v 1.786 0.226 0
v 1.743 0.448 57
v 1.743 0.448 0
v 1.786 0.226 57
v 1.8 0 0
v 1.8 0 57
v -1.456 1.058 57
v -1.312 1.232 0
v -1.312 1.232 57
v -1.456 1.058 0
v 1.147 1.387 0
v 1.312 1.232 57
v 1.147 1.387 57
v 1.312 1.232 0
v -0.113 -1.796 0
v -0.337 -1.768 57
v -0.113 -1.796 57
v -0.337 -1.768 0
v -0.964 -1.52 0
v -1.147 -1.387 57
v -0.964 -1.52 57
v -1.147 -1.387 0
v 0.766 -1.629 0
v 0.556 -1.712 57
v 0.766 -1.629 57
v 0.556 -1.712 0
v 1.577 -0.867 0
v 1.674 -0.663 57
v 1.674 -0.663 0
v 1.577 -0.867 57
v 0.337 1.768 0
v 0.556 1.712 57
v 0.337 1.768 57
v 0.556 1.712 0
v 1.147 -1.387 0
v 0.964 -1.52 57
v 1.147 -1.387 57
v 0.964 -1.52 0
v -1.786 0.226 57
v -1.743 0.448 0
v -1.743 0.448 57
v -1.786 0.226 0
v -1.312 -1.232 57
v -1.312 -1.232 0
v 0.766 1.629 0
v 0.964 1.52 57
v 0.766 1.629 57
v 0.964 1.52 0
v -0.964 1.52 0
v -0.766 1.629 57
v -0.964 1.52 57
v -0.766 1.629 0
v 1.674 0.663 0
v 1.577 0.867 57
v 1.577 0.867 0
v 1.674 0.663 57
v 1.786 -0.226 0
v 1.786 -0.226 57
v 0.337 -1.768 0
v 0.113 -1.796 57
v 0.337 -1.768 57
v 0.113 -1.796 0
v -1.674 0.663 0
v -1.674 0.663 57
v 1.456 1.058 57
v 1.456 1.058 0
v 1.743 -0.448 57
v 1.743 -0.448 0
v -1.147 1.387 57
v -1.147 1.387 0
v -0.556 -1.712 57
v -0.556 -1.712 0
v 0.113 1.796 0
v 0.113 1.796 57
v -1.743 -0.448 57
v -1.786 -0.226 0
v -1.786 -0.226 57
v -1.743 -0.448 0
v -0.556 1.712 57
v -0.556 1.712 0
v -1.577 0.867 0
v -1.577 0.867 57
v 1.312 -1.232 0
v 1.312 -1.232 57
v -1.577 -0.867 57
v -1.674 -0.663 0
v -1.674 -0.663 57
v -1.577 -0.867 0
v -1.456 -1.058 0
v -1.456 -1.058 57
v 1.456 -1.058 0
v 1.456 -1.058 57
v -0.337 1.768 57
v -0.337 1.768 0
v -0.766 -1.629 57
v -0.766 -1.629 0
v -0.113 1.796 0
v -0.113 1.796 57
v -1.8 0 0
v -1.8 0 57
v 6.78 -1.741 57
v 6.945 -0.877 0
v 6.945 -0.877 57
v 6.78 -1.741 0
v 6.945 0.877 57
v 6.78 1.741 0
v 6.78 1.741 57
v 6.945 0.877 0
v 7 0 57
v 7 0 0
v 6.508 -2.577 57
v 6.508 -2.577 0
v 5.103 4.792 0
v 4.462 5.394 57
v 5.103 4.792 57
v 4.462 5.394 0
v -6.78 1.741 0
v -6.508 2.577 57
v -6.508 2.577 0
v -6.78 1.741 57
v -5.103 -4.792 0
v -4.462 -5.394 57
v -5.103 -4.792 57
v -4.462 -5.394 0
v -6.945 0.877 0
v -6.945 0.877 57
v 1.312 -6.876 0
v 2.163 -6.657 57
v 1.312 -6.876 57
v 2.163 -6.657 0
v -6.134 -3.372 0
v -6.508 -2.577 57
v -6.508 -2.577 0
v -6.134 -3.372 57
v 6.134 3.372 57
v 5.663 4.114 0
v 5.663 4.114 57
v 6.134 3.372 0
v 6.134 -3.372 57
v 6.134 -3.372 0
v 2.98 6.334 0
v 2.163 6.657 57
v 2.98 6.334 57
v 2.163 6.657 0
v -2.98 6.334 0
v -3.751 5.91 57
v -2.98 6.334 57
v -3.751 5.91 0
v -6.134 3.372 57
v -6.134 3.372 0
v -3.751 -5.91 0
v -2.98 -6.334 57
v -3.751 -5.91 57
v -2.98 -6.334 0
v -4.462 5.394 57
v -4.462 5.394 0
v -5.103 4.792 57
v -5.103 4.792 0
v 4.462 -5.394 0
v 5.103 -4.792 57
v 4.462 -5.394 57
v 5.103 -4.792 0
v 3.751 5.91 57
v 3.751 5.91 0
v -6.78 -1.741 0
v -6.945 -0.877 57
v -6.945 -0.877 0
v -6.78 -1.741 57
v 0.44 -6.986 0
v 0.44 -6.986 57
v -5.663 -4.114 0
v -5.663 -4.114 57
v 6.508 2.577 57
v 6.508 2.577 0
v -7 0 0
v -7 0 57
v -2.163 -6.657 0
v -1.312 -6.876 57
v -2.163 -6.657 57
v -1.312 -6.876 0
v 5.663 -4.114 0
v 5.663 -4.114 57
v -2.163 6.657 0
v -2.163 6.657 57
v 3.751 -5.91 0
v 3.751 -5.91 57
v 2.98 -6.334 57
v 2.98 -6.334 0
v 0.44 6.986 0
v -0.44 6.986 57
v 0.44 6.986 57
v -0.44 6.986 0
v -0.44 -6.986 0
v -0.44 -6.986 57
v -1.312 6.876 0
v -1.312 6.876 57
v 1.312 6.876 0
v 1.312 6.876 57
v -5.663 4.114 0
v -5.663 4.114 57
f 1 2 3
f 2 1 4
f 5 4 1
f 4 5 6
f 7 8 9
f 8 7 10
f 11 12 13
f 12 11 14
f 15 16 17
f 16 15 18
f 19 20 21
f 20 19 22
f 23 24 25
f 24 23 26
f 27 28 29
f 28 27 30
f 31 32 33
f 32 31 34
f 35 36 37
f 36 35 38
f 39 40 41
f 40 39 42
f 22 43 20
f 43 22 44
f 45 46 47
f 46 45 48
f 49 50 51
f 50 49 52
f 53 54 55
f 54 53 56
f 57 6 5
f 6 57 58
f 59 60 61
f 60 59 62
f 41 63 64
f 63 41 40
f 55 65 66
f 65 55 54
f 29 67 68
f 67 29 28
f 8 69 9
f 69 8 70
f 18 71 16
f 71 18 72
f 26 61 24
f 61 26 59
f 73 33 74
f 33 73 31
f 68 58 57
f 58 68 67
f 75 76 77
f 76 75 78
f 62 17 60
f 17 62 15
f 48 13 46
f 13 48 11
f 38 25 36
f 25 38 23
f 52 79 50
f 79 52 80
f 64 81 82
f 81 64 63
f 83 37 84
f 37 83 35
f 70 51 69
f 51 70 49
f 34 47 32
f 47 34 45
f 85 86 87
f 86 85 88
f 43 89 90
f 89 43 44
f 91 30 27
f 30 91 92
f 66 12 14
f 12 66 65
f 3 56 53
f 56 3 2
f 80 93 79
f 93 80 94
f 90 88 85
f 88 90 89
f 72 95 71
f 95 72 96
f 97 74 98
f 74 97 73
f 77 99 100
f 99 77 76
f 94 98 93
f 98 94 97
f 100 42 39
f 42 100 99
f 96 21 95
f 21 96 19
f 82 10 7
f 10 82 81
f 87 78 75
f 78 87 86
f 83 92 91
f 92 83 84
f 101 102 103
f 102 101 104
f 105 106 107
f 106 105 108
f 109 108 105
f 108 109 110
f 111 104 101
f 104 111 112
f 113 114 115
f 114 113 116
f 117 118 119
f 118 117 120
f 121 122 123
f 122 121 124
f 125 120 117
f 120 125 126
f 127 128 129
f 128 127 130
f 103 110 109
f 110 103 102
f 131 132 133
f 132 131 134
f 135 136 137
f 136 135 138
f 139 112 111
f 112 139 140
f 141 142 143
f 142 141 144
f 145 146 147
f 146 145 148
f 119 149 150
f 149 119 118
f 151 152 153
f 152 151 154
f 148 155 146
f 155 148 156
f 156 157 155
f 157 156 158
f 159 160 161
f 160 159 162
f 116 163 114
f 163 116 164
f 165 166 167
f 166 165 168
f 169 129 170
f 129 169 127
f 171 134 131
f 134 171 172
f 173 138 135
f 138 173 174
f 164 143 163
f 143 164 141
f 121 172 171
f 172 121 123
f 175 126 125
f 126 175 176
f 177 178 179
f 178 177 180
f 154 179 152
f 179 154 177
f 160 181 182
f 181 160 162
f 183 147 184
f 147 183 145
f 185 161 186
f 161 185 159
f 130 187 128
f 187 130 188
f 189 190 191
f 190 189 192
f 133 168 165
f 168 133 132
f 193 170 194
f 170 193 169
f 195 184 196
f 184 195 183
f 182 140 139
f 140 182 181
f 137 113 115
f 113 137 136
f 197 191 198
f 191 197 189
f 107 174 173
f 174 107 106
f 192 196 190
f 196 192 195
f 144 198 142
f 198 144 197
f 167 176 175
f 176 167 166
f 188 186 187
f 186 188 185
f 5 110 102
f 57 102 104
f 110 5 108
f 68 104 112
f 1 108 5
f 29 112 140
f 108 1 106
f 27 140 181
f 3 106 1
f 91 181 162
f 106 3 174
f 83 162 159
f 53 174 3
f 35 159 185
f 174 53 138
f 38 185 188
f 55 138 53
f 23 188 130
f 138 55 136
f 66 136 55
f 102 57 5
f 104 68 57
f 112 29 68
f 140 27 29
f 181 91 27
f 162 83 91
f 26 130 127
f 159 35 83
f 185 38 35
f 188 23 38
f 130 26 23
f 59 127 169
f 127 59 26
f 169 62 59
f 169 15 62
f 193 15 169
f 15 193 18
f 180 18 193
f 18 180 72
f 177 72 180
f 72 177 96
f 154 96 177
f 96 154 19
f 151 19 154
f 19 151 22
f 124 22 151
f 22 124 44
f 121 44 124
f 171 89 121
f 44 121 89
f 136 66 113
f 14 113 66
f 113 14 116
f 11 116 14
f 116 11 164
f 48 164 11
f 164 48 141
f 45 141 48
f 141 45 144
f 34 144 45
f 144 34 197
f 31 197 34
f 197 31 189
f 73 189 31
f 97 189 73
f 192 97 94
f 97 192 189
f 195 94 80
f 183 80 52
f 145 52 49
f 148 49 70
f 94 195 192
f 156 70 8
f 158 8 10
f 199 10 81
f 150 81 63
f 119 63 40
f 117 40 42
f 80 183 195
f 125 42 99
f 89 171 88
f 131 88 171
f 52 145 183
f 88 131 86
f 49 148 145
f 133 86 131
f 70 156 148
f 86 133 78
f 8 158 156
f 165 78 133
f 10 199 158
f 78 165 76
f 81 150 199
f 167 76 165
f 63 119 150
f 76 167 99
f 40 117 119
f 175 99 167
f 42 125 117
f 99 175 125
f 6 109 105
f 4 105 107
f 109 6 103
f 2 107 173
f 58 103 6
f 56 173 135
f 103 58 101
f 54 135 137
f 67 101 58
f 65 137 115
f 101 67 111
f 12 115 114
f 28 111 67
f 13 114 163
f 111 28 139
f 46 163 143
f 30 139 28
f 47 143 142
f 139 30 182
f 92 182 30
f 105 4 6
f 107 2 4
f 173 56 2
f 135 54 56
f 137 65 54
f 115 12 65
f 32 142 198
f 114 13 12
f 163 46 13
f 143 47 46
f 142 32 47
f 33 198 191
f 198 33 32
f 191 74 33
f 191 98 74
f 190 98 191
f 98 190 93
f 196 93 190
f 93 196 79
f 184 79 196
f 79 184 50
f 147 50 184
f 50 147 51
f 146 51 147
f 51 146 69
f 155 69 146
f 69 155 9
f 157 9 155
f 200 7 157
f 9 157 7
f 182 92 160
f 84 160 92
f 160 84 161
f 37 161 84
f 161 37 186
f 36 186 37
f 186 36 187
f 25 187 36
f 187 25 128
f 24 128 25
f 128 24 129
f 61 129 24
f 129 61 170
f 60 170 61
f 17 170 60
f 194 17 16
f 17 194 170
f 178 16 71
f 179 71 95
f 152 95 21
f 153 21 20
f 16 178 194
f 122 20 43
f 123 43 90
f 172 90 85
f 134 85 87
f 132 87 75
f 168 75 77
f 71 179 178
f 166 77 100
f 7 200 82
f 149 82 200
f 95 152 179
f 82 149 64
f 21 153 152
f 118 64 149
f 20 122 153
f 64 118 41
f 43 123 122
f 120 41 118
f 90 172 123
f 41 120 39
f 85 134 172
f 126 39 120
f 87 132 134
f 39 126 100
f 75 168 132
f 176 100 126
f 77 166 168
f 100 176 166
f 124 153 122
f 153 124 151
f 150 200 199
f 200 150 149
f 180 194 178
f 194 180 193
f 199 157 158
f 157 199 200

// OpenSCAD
$fn = 50;


difference() {
	union() {
		cylinder(h = 57, r = 7.0000000000);
	}
	union() {
		translate(v = [0.0000000000, 0.0000000000, -100.0000000000]) {
			cylinder(h = 200, r = 1.8000000000);
		}
		cylinder(h = 57, r = 1.8000000000);
		cylinder(h = 57, r = 1.8000000000);
		cylinder(h = 57, r = 1.8000000000);
	}
}
